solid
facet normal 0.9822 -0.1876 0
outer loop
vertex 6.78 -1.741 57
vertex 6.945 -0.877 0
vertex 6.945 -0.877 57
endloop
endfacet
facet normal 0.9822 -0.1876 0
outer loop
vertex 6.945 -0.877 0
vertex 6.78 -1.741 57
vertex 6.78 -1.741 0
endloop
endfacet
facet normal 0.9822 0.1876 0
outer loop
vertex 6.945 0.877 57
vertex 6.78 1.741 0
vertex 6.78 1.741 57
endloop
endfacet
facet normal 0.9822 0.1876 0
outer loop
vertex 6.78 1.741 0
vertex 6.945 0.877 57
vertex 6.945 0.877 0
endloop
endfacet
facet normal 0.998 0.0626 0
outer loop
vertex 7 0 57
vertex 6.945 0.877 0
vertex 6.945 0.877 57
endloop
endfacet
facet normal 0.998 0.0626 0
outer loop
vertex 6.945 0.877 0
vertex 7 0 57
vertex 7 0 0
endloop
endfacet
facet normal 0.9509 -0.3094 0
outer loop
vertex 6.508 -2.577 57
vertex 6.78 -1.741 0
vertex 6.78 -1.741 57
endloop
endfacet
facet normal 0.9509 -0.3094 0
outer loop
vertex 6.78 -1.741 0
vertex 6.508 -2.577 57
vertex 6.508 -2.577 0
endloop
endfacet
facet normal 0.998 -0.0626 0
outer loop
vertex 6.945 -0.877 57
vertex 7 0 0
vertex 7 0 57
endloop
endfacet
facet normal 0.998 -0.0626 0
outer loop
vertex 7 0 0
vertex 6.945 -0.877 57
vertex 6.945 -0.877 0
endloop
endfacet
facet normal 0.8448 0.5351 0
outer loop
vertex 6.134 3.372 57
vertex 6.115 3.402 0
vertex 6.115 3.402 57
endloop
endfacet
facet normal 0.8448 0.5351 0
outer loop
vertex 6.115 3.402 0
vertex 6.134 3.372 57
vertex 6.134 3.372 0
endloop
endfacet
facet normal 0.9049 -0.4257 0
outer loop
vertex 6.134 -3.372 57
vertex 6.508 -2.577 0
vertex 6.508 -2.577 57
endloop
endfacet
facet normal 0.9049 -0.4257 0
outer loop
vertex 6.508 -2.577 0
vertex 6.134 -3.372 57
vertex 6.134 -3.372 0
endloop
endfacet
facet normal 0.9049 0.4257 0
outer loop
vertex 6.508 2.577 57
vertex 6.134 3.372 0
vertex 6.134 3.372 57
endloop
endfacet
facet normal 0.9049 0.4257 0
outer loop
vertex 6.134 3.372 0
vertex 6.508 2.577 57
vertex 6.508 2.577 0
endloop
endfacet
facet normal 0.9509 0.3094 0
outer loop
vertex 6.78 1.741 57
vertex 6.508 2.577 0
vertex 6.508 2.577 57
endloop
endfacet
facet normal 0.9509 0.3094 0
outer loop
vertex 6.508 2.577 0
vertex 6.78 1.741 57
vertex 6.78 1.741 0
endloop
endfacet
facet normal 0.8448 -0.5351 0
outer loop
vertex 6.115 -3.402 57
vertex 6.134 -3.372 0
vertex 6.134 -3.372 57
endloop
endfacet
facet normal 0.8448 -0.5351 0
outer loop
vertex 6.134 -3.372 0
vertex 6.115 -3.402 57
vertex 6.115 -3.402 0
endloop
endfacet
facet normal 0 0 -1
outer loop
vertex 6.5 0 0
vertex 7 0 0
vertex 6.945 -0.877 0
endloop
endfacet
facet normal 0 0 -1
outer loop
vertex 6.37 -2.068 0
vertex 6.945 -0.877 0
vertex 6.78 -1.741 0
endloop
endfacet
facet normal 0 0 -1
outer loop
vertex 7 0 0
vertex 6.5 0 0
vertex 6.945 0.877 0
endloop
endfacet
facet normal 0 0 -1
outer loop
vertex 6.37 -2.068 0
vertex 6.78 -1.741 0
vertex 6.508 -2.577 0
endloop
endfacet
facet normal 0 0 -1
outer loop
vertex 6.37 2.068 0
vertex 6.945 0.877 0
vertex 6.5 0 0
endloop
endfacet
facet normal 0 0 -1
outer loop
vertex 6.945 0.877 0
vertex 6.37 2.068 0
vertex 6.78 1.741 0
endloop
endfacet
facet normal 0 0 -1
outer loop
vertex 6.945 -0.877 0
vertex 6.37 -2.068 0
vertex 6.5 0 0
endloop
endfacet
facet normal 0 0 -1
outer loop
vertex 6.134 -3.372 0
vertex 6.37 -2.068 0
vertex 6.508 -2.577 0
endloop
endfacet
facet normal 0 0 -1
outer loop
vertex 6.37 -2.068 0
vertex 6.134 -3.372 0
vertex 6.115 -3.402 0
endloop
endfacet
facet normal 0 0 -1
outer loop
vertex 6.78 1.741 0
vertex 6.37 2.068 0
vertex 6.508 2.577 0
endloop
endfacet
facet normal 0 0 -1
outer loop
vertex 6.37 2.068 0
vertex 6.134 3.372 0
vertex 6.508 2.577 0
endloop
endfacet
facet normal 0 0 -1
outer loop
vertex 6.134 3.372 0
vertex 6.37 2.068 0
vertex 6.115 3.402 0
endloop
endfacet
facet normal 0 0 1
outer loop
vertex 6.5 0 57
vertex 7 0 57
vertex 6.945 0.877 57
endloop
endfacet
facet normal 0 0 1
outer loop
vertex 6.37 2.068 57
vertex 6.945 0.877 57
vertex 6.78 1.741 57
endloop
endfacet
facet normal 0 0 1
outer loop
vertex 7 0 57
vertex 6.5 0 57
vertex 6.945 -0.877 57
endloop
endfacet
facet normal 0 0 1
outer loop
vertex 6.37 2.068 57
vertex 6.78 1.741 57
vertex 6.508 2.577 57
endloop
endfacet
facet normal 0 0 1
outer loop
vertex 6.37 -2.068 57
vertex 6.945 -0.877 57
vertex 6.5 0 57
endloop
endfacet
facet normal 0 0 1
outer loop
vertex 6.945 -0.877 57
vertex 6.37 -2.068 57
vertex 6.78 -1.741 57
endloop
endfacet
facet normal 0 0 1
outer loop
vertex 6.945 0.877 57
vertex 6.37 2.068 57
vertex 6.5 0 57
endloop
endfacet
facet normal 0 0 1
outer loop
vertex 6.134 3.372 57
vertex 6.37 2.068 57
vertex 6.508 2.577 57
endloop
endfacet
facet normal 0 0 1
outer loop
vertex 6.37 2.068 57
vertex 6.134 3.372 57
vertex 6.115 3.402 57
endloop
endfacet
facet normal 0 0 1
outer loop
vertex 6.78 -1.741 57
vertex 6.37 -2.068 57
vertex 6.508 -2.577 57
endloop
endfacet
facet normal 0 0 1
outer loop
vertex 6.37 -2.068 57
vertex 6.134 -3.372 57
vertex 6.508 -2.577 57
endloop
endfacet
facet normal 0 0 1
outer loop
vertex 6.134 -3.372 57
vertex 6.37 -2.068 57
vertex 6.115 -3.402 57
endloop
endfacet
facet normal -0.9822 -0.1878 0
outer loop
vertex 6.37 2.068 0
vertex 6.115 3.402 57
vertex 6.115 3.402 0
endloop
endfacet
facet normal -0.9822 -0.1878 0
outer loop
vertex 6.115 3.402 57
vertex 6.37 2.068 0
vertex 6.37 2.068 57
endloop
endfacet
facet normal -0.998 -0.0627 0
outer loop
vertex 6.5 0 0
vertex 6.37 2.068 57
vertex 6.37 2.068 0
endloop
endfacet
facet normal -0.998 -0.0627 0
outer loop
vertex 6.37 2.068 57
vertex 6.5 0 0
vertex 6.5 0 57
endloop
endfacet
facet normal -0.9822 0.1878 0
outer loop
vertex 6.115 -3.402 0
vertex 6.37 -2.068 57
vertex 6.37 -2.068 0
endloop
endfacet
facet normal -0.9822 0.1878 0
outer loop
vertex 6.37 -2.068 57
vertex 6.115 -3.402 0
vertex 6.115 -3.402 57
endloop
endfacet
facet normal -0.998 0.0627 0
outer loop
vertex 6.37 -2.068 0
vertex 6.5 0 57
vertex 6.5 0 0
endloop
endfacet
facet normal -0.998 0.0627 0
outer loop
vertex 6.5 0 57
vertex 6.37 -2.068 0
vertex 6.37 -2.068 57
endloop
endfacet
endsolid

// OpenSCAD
$fn = 50;


difference() {
	union() {
		cylinder(h = 57, r = 7.0000000000);
		translate(v = [-13.0000000000, 0, 0]) {
			cylinder(h = 57, r = 7.0000000000);
		}
	}
	union() {
		cylinder(h = 57, r = 3.2500000000);
		cylinder(h = 57, r = 1.8000000000);
		cylinder(h = 57, r = 1.8000000000);
		cylinder(h = 57, r = 1.8000000000);
		translate(v = [-17.5000000000, 0, 0]) {
			hull() {
				translate(v = [-3.7500000000, 0.0000000000, 0]) {
					cylinder(h = 57, r = 7.5000000000);
				}
				translate(v = [3.7500000000, 0.0000000000, 0]) {
					cylinder(h = 57, r = 7.5000000000);
				}
				translate(v = [-3.7500000000, -0.0000000000, 0]) {
					cylinder(h = 57, r = 7.5000000000);
				}
				translate(v = [3.7500000000, -0.0000000000, 0]) {
					cylinder(h = 57, r = 7.5000000000);
				}
			}
		}
		translate(v = [-10.0000000000, 0, 0.0000000000]) {
			cylinder(h = 57, r = 16.5000000000);
		}
	}
}
